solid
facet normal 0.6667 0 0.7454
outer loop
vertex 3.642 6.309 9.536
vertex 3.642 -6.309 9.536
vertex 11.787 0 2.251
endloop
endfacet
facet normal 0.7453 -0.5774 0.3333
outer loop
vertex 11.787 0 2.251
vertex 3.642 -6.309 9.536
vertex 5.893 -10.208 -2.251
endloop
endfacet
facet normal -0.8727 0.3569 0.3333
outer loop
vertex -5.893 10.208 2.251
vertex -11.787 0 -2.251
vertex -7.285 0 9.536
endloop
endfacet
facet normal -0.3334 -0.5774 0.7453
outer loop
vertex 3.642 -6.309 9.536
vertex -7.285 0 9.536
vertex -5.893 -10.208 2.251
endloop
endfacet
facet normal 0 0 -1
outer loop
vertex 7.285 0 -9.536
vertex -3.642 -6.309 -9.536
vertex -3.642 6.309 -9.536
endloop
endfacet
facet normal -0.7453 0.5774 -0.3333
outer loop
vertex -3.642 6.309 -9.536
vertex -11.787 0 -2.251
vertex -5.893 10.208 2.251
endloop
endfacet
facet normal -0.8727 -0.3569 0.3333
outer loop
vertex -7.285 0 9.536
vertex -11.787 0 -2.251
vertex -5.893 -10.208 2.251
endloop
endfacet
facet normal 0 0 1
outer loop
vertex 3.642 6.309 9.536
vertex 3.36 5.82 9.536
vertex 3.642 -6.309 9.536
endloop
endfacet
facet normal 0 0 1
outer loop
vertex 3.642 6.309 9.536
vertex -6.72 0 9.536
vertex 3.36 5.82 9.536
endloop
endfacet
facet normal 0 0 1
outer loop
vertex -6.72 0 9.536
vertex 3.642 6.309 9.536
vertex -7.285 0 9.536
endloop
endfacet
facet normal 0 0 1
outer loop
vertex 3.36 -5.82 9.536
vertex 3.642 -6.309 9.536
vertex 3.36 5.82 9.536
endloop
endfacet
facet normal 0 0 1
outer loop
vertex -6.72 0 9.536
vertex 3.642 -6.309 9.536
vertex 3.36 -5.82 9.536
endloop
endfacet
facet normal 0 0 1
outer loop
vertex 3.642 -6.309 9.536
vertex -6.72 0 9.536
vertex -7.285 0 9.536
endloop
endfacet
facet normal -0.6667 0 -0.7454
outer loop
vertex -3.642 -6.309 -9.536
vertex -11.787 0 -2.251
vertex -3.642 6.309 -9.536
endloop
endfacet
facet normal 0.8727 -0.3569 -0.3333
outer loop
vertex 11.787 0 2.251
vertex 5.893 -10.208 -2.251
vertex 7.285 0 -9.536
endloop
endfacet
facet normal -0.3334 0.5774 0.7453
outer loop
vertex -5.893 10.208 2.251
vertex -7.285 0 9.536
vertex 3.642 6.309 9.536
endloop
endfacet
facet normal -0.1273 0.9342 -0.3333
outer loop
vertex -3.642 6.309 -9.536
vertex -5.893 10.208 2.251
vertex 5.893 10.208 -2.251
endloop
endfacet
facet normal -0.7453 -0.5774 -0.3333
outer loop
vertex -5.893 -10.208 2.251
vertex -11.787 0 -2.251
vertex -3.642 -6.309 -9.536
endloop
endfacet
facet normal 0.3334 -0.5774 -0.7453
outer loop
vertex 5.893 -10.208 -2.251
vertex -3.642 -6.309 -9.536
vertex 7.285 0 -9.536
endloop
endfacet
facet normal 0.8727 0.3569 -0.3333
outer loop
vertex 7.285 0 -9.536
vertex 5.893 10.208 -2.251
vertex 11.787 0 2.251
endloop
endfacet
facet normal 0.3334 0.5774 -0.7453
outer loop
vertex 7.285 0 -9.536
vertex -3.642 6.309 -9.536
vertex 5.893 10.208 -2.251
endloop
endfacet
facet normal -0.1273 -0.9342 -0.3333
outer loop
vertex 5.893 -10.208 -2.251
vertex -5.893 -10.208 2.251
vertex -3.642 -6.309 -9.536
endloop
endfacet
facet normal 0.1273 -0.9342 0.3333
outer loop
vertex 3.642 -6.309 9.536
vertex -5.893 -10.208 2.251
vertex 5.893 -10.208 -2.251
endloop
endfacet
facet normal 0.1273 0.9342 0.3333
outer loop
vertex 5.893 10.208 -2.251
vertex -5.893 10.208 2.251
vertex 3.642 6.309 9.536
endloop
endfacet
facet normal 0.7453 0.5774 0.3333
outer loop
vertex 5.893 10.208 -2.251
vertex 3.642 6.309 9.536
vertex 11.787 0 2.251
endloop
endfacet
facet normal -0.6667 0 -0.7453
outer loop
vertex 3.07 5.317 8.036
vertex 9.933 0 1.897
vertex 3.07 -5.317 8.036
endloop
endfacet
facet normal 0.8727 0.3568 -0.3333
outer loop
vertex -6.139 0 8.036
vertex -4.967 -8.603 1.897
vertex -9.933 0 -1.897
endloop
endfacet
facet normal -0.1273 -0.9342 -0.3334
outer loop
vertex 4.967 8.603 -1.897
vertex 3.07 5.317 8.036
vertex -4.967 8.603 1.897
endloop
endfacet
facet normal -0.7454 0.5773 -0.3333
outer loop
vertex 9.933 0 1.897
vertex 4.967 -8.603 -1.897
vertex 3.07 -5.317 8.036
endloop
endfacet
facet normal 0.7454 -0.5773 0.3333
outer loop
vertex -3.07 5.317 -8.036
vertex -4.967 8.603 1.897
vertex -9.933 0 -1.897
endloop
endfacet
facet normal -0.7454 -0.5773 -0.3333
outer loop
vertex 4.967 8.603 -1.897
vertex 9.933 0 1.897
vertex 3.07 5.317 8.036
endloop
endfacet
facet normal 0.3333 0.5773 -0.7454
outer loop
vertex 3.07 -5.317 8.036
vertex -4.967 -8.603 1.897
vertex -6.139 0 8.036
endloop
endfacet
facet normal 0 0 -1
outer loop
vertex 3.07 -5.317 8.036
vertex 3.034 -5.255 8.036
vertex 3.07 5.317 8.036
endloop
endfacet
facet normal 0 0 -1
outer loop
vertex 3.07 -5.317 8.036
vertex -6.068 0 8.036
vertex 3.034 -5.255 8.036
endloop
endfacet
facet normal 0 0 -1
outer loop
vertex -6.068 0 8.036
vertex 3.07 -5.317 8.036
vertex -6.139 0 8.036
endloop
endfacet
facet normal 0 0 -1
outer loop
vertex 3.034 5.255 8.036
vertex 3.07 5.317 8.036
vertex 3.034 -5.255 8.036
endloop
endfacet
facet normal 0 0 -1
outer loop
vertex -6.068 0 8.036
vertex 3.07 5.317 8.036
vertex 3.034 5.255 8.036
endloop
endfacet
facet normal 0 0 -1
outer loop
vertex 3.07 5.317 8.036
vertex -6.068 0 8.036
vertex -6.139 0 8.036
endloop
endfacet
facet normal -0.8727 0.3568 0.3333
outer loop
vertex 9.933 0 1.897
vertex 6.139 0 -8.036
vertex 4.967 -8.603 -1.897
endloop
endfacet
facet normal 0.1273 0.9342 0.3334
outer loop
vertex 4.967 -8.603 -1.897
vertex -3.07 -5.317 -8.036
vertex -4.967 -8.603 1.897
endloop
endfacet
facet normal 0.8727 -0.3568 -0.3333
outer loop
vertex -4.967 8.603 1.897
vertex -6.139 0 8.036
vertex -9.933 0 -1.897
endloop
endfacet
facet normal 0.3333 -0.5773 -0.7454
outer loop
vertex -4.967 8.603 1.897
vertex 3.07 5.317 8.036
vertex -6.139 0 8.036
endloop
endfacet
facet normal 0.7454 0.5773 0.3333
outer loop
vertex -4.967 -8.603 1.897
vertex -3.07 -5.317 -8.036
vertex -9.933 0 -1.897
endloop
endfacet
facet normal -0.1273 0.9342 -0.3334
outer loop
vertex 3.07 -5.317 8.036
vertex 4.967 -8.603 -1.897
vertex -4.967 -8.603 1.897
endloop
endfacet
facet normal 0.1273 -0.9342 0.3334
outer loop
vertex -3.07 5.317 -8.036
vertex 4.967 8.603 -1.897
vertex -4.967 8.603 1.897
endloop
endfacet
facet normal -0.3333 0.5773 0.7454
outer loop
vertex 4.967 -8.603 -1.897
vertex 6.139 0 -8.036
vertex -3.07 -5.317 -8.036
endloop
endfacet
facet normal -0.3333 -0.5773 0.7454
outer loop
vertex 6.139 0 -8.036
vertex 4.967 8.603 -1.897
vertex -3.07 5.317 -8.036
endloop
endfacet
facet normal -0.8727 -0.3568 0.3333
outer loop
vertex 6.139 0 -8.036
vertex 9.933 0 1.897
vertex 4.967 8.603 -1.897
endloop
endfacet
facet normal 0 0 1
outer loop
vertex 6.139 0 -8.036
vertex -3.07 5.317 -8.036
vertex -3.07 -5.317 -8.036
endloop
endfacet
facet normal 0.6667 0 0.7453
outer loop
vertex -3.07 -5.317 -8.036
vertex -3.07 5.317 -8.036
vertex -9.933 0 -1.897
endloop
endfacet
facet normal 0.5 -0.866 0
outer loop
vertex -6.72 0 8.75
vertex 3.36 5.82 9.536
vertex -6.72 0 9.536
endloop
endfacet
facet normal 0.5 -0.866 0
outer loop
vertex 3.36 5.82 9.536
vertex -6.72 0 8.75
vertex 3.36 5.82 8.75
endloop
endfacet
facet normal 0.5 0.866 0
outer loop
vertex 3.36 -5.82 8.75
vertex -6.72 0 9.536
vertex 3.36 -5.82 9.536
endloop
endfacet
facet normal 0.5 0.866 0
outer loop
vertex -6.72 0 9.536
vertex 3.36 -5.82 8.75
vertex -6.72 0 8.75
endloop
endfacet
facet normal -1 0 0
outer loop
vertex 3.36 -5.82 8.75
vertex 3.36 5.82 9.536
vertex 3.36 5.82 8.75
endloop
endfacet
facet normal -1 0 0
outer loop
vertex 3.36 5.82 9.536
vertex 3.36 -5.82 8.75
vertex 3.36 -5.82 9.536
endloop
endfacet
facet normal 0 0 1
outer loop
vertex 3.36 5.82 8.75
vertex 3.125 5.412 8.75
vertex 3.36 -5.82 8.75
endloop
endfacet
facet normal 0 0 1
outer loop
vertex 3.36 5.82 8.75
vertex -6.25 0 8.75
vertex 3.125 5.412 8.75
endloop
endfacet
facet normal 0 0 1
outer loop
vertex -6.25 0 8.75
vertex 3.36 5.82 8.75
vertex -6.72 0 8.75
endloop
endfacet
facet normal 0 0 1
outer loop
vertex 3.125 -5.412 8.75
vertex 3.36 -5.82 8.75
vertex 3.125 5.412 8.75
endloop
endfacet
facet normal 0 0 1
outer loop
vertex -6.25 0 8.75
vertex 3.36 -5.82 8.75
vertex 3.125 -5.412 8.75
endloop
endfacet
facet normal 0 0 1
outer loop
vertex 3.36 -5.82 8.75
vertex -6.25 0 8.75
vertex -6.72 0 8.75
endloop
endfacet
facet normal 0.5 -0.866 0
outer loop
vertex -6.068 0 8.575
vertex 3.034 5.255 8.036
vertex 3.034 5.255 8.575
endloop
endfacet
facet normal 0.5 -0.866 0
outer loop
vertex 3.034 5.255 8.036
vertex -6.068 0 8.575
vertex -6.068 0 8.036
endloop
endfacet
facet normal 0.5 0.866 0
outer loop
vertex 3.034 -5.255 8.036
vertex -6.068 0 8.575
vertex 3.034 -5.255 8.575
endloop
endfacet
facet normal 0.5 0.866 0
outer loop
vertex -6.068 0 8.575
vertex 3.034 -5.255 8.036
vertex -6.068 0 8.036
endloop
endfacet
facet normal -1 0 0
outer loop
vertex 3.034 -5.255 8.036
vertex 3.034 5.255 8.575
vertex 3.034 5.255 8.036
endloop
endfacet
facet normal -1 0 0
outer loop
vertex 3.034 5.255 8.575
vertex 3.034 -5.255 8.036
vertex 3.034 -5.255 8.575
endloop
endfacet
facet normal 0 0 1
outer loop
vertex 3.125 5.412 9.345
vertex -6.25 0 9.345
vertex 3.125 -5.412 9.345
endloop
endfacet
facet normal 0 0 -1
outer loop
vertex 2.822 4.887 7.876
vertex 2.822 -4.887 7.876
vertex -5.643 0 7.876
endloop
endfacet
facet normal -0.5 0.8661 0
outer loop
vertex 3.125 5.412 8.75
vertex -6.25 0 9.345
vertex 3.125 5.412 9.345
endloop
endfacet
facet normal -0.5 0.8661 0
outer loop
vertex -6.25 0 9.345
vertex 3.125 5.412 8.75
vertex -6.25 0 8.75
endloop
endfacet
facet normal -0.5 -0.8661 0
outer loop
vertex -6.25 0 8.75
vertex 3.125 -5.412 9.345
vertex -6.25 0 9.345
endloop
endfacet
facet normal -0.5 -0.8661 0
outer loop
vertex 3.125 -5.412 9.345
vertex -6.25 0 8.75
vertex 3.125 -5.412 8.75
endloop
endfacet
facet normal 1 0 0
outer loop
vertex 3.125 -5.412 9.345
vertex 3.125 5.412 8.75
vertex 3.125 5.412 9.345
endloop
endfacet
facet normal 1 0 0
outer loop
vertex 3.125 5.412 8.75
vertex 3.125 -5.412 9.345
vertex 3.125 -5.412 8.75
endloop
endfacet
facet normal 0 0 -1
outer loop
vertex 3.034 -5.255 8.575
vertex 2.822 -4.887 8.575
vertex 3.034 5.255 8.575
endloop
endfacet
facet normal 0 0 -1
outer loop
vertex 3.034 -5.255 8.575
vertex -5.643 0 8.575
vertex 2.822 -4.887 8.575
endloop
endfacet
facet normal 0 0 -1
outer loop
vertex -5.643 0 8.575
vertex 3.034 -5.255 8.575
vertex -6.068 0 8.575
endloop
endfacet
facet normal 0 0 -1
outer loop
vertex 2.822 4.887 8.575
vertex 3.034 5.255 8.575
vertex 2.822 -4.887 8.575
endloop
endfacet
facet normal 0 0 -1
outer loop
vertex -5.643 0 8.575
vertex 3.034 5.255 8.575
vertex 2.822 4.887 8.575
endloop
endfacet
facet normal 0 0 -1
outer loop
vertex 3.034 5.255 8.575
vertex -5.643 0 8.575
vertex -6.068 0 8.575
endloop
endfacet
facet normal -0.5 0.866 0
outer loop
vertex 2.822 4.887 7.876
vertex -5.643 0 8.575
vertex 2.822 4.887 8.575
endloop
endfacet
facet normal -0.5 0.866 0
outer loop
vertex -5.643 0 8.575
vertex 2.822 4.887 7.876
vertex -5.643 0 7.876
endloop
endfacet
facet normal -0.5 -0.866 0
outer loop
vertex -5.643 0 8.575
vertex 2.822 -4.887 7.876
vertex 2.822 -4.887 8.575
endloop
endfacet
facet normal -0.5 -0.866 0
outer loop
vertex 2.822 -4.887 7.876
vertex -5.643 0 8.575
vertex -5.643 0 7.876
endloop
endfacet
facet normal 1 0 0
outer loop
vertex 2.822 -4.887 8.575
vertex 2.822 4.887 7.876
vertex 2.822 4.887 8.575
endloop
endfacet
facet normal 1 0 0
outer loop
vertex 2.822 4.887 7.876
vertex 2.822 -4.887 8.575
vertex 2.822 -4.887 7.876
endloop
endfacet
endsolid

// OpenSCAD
angle = 20.905;
externalRadius = 12;
internalRdius = 10.113; // Pour épaisseur paroi 1.5 mm
diametreTrouBouchon = 1.5;
echelleReductionAjustementBouchon = 0.93;
r = 0.19; // résolution d'impression sur l'axe Z

//ico_creux();
//decoupe_bouchon();
corps_ouvert();
bouchon();
//trou();

module corps_ouvert() {
    //rotate([180, 0, 0])
	difference() {
		ico_creux();
		decoupe_bouchon();
	}
}

module bouchon(version) {
    //rotate([180, 0, 0])
	scale([echelleReductionAjustementBouchon, echelleReductionAjustementBouchon, 0.98])
	difference () {
        intersection() {
            ico_creux();
            decoupe_bouchon(echelleReductionAjustementBouchon);
        }
        // trou centre face
//		translate([0, 0, externalRadius*0.5])
//		cylinder(30, r=diametreTrouBouchon/2, $fn=22);
	}
}

module trou() {
    rotate([0, -37.3, 0])
		translate([0, 0, externalRadius*0.5])
		cylinder(30, r=diametreTrouBouchon/2, $fn=22);
}

module ico_creux() {
	difference() {
        rotate([0, angle, 0]) icosahedron(externalRadius);
        rotate([0, angle, 0]) icosahedron(internalRdius);
	}
}

module decoupe_bouchon(scale=1) {
	rotate([0,0,60]) translate([0,0,externalRadius*0.65+5*r])
		cylinder(6*r, r=externalRadius*0.56, $fn=3);
	rotate([0,0,60]) translate([0,0,externalRadius*0.65])
		cylinder(6*r, r=internalRdius*0.6, $fn=3);
}

module icosahedron(rad=1) {
	Cphi = (1+sqrt(5))/2;

	// Convert spherical to cartesian
	function sph_to_cart(c, rad) = [
		rad*sin(atan2(sqrt(c[0]*c[0]+c[1]*c[1]), c[2]))*cos(atan2(c[1],c[0])),  
		rad*sin(atan2(sqrt(c[0]*c[0]+c[1]*c[1]), c[2]))*sin(atan2(c[1],c[0])),
		rad*cos(atan2(sqrt(c[0]*c[0]+c[1]*c[1]), c[2]))
		];


	//================================================
	//	Icosahedron
	//================================================
	//
	// (0, +-1, +-Cphi)
	// (+-Cphi, 0, +-1)
	// (+-1, +-Cphi, 0)

	function icosa_unit(rad) = [
		sph_to_cart([0, +1, +Cphi], rad), 
		sph_to_cart([0, +1, -Cphi], rad),
		sph_to_cart([0, -1, -Cphi], rad),
		sph_to_cart([0, -1, +Cphi], rad),
		sph_to_cart([+Cphi, 0, +1], rad), 
		sph_to_cart([+Cphi, 0, -1], rad), 
		sph_to_cart([-Cphi, 0, -1], rad),
		sph_to_cart([-Cphi, 0, +1], rad),
		sph_to_cart([+1, +Cphi, 0], rad),
		sph_to_cart([+1, -Cphi, 0], rad), 
		sph_to_cart([-1, -Cphi, 0], rad), 
		sph_to_cart([-1, +Cphi, 0], rad),
		];

	icosa_faces = [ 
		[3,0,4],
		[3,4,9],
		[3,9,10],
		[3,10,7],
		[3,7,0],
		[0,8,4],
		[0,7,11],
		[0,11,8],
		[4,8,5],
		[4,5,9],
		[7,10,6],
		[7,6,11],
		[9,5,2],
		[9,2,10],
		[2,6,10],
		[1,5,8],
		[1,8,11],
		[1,11,6],
		[5,1,2],
		[2,1,6]
		];

	polyhedron(icosa_unit(rad), faces = icosa_faces);
}
